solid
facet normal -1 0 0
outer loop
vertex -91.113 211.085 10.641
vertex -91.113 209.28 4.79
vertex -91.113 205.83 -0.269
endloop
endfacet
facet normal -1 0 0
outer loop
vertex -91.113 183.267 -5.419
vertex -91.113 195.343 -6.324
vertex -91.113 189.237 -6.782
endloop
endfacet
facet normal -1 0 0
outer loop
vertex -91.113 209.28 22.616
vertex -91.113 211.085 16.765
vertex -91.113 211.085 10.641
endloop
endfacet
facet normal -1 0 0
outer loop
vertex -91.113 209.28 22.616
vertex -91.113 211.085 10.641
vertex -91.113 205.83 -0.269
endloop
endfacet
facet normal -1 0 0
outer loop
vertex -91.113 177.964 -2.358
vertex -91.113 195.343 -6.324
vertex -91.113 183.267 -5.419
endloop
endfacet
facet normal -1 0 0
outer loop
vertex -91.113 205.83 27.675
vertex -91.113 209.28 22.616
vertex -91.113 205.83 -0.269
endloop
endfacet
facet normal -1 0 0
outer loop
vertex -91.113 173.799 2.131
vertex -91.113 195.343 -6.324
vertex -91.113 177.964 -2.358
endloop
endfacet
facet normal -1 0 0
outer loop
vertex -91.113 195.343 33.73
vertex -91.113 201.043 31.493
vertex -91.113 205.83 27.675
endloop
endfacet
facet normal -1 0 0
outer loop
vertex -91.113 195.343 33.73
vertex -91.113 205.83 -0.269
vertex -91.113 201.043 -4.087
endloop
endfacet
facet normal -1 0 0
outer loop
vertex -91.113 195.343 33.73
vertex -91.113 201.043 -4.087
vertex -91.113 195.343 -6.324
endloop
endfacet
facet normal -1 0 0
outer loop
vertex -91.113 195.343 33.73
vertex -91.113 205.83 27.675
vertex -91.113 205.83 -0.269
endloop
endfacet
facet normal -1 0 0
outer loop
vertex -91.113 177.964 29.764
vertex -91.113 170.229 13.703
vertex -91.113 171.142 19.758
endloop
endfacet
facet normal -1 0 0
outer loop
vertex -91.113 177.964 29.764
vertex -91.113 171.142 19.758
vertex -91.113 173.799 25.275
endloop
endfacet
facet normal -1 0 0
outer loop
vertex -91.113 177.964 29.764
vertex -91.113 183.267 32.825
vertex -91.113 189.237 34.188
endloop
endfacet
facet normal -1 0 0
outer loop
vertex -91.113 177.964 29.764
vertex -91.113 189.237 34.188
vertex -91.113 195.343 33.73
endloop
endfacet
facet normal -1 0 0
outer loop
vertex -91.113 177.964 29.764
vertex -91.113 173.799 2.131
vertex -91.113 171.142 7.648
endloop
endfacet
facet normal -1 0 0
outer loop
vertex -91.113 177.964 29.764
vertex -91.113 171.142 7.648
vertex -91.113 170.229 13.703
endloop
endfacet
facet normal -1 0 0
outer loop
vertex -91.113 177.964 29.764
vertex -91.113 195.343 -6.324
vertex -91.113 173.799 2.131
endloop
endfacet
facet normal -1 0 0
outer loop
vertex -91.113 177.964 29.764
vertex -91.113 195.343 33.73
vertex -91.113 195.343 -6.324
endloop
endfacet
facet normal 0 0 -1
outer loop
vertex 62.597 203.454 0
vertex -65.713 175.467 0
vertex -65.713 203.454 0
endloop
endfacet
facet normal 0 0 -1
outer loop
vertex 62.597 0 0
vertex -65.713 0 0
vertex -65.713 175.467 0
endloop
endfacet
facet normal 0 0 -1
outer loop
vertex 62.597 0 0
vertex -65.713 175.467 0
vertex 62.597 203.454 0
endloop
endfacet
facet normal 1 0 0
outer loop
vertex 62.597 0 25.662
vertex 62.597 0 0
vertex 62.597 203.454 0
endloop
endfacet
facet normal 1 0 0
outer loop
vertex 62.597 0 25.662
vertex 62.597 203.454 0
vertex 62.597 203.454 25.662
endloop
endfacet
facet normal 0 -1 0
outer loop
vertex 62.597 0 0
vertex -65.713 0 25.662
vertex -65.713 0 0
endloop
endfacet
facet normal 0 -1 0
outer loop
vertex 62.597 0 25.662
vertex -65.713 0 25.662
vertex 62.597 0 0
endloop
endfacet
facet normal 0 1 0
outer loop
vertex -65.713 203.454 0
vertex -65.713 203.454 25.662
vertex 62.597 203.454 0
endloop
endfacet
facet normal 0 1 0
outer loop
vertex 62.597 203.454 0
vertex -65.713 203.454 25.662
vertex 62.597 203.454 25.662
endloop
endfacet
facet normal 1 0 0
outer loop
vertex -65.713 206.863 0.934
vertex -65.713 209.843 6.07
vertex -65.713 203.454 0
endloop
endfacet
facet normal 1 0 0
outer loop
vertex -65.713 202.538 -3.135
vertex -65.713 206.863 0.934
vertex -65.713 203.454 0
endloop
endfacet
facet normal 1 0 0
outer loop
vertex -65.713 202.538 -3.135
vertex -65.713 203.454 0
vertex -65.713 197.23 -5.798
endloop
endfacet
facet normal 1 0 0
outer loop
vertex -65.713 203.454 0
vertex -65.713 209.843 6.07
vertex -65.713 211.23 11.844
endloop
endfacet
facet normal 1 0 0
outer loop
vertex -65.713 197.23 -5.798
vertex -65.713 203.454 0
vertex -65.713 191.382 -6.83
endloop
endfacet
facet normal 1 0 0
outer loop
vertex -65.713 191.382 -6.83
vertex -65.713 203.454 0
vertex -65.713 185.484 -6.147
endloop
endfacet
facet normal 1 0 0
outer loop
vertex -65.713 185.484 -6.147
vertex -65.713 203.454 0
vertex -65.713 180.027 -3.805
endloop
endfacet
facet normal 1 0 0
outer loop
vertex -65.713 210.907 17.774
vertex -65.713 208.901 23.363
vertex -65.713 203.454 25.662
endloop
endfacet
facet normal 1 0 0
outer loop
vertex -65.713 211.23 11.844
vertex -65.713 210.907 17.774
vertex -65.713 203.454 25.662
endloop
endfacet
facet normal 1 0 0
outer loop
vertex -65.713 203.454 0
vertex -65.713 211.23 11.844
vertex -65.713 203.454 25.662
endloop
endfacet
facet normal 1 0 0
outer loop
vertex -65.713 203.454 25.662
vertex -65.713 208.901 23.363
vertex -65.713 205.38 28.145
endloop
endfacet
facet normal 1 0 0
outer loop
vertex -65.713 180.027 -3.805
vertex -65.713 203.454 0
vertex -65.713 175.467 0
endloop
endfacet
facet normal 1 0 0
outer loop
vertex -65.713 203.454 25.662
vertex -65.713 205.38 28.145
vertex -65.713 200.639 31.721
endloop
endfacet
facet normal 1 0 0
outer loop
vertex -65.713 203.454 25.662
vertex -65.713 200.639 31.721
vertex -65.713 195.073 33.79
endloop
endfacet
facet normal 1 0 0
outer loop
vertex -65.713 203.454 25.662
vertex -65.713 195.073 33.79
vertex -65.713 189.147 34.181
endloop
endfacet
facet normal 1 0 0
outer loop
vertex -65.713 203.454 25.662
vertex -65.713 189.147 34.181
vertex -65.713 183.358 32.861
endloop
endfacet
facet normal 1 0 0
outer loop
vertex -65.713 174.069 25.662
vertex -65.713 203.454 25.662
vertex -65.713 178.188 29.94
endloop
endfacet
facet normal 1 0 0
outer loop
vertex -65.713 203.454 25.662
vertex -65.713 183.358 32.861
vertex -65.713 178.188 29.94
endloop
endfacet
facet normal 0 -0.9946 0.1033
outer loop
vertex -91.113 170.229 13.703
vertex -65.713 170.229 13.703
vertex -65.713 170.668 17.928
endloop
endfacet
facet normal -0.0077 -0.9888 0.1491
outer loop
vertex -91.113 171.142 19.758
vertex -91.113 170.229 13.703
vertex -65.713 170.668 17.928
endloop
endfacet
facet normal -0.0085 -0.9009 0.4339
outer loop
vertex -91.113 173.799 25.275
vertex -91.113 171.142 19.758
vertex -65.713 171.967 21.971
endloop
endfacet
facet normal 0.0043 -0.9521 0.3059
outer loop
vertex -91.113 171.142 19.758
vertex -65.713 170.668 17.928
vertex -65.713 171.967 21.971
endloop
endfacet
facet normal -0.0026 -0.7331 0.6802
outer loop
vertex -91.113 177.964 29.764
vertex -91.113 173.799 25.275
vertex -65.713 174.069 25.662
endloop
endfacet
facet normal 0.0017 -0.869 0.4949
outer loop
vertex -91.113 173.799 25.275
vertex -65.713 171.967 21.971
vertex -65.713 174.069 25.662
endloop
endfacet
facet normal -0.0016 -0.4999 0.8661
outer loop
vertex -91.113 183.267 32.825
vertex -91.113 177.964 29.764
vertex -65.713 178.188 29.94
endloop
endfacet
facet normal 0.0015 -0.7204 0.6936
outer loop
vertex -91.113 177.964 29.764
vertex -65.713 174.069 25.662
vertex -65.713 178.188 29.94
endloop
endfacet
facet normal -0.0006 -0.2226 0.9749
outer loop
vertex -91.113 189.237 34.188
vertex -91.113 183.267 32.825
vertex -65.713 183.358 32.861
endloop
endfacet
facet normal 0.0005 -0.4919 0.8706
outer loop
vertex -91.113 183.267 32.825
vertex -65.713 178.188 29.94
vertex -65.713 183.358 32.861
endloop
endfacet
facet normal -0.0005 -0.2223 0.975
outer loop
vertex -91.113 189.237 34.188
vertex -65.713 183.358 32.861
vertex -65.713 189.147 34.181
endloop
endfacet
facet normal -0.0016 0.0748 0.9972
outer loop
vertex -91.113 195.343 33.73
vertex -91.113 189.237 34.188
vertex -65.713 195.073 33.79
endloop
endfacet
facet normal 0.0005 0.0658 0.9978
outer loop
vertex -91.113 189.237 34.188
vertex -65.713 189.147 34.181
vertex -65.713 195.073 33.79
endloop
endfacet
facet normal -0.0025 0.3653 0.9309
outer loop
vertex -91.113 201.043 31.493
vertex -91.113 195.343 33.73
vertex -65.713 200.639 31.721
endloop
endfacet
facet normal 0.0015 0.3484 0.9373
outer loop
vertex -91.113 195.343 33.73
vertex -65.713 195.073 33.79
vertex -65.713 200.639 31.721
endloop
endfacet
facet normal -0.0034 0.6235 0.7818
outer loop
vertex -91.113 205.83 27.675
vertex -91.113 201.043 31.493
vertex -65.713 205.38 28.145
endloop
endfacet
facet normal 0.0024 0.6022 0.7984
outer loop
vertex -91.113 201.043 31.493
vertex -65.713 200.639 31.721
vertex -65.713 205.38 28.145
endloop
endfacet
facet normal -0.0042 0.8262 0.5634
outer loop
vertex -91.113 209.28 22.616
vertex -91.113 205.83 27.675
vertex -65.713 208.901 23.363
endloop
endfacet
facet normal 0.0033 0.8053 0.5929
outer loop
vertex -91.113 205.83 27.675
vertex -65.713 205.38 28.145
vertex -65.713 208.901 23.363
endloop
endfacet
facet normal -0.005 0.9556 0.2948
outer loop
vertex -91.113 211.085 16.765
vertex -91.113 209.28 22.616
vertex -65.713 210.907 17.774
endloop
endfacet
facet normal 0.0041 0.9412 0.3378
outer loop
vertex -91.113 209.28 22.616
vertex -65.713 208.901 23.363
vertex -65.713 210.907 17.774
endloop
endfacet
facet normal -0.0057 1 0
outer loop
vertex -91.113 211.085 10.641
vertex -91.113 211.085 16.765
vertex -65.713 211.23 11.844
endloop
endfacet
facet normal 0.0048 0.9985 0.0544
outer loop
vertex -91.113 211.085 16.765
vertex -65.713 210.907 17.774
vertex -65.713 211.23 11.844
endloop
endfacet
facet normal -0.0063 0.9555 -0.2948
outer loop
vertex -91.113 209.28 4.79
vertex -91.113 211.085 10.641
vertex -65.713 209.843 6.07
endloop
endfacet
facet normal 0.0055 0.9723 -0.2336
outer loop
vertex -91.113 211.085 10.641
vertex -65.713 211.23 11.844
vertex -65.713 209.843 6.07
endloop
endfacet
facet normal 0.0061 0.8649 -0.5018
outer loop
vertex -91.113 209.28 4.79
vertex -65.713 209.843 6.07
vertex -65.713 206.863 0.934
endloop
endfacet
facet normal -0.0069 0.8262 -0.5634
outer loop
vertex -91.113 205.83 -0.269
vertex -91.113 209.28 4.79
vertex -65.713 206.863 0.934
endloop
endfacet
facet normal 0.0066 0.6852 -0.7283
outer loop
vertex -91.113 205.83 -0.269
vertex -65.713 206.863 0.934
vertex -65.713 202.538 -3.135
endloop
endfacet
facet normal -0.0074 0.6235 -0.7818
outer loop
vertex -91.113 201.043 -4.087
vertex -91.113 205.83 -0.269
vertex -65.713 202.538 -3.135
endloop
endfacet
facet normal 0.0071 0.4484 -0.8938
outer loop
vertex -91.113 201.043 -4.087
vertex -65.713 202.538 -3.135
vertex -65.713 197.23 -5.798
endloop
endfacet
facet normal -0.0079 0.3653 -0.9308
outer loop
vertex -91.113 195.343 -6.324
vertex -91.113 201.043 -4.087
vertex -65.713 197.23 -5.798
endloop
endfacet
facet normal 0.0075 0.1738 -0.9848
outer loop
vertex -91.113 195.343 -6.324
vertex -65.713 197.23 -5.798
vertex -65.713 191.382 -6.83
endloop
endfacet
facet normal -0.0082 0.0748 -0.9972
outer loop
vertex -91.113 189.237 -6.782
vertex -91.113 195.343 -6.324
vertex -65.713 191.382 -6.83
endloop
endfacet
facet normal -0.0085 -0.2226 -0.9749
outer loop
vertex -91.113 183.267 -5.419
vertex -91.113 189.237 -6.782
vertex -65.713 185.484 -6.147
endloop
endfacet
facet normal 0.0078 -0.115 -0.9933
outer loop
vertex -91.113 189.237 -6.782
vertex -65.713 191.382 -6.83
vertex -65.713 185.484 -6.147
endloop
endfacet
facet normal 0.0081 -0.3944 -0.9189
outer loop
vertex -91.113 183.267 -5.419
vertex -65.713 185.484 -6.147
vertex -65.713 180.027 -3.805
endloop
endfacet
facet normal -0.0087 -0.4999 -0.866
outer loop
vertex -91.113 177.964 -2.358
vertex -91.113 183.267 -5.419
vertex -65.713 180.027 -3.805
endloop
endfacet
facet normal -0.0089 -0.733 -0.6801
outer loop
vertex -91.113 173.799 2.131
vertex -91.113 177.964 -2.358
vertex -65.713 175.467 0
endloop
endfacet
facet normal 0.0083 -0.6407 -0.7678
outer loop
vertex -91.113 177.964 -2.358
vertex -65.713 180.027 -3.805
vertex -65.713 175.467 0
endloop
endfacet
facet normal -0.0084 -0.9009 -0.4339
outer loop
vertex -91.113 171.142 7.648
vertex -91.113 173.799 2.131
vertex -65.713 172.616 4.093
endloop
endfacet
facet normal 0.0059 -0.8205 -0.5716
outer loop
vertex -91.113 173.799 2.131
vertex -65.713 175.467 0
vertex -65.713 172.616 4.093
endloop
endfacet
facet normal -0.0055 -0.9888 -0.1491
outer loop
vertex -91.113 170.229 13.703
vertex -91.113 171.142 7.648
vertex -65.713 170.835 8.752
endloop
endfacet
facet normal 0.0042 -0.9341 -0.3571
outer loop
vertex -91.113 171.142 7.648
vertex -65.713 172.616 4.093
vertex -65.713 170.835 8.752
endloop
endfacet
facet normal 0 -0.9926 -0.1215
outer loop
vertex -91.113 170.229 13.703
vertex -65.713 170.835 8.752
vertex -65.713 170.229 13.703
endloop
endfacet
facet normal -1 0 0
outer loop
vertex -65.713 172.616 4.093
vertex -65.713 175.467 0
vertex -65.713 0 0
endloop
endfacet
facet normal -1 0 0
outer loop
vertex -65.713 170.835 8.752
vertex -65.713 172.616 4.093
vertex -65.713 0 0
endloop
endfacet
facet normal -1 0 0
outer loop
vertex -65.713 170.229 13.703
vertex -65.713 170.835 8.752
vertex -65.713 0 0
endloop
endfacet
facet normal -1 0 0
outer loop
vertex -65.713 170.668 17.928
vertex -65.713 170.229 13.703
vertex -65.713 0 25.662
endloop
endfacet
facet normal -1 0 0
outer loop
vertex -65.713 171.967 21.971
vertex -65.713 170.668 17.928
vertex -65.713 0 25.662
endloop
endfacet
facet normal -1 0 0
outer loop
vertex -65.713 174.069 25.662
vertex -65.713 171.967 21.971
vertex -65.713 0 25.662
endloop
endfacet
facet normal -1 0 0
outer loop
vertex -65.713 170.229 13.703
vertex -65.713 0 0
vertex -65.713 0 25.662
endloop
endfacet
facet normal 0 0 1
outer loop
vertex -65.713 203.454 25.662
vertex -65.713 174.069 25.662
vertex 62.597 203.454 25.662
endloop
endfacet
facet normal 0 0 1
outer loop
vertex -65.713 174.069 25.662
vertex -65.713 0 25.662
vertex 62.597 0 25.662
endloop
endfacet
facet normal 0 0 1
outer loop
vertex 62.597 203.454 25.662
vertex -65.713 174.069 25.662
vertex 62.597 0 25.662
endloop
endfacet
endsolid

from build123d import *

# Parameters (mm, degrees)
F0_W     = 128.30928
F0_H     = 25.661856
F1_DEPTH = 203.454
F2_R     = 20.542437
F3_DEPTH = 25.4


with BuildPart() as f1:
    # F0 (on Front) → F1 (new body)
    with BuildSketch(Plane.XZ):
        with Locations((-1.558043, 12.830928)):
            Rectangle(F0_W, F0_H)
    extrude(amount=-F1_DEPTH)

    # F2 (on face) → F3 (join)
    with BuildSketch(Plane(origin=(-65.712683, 0, 0), x_dir=(0, -1, 0), z_dir=(-1, 0, 0))):
        with Locations((-190.771684, 13.703045)):
            Circle(F2_R)
    extrude(amount=F3_DEPTH)


solid = f1.part
